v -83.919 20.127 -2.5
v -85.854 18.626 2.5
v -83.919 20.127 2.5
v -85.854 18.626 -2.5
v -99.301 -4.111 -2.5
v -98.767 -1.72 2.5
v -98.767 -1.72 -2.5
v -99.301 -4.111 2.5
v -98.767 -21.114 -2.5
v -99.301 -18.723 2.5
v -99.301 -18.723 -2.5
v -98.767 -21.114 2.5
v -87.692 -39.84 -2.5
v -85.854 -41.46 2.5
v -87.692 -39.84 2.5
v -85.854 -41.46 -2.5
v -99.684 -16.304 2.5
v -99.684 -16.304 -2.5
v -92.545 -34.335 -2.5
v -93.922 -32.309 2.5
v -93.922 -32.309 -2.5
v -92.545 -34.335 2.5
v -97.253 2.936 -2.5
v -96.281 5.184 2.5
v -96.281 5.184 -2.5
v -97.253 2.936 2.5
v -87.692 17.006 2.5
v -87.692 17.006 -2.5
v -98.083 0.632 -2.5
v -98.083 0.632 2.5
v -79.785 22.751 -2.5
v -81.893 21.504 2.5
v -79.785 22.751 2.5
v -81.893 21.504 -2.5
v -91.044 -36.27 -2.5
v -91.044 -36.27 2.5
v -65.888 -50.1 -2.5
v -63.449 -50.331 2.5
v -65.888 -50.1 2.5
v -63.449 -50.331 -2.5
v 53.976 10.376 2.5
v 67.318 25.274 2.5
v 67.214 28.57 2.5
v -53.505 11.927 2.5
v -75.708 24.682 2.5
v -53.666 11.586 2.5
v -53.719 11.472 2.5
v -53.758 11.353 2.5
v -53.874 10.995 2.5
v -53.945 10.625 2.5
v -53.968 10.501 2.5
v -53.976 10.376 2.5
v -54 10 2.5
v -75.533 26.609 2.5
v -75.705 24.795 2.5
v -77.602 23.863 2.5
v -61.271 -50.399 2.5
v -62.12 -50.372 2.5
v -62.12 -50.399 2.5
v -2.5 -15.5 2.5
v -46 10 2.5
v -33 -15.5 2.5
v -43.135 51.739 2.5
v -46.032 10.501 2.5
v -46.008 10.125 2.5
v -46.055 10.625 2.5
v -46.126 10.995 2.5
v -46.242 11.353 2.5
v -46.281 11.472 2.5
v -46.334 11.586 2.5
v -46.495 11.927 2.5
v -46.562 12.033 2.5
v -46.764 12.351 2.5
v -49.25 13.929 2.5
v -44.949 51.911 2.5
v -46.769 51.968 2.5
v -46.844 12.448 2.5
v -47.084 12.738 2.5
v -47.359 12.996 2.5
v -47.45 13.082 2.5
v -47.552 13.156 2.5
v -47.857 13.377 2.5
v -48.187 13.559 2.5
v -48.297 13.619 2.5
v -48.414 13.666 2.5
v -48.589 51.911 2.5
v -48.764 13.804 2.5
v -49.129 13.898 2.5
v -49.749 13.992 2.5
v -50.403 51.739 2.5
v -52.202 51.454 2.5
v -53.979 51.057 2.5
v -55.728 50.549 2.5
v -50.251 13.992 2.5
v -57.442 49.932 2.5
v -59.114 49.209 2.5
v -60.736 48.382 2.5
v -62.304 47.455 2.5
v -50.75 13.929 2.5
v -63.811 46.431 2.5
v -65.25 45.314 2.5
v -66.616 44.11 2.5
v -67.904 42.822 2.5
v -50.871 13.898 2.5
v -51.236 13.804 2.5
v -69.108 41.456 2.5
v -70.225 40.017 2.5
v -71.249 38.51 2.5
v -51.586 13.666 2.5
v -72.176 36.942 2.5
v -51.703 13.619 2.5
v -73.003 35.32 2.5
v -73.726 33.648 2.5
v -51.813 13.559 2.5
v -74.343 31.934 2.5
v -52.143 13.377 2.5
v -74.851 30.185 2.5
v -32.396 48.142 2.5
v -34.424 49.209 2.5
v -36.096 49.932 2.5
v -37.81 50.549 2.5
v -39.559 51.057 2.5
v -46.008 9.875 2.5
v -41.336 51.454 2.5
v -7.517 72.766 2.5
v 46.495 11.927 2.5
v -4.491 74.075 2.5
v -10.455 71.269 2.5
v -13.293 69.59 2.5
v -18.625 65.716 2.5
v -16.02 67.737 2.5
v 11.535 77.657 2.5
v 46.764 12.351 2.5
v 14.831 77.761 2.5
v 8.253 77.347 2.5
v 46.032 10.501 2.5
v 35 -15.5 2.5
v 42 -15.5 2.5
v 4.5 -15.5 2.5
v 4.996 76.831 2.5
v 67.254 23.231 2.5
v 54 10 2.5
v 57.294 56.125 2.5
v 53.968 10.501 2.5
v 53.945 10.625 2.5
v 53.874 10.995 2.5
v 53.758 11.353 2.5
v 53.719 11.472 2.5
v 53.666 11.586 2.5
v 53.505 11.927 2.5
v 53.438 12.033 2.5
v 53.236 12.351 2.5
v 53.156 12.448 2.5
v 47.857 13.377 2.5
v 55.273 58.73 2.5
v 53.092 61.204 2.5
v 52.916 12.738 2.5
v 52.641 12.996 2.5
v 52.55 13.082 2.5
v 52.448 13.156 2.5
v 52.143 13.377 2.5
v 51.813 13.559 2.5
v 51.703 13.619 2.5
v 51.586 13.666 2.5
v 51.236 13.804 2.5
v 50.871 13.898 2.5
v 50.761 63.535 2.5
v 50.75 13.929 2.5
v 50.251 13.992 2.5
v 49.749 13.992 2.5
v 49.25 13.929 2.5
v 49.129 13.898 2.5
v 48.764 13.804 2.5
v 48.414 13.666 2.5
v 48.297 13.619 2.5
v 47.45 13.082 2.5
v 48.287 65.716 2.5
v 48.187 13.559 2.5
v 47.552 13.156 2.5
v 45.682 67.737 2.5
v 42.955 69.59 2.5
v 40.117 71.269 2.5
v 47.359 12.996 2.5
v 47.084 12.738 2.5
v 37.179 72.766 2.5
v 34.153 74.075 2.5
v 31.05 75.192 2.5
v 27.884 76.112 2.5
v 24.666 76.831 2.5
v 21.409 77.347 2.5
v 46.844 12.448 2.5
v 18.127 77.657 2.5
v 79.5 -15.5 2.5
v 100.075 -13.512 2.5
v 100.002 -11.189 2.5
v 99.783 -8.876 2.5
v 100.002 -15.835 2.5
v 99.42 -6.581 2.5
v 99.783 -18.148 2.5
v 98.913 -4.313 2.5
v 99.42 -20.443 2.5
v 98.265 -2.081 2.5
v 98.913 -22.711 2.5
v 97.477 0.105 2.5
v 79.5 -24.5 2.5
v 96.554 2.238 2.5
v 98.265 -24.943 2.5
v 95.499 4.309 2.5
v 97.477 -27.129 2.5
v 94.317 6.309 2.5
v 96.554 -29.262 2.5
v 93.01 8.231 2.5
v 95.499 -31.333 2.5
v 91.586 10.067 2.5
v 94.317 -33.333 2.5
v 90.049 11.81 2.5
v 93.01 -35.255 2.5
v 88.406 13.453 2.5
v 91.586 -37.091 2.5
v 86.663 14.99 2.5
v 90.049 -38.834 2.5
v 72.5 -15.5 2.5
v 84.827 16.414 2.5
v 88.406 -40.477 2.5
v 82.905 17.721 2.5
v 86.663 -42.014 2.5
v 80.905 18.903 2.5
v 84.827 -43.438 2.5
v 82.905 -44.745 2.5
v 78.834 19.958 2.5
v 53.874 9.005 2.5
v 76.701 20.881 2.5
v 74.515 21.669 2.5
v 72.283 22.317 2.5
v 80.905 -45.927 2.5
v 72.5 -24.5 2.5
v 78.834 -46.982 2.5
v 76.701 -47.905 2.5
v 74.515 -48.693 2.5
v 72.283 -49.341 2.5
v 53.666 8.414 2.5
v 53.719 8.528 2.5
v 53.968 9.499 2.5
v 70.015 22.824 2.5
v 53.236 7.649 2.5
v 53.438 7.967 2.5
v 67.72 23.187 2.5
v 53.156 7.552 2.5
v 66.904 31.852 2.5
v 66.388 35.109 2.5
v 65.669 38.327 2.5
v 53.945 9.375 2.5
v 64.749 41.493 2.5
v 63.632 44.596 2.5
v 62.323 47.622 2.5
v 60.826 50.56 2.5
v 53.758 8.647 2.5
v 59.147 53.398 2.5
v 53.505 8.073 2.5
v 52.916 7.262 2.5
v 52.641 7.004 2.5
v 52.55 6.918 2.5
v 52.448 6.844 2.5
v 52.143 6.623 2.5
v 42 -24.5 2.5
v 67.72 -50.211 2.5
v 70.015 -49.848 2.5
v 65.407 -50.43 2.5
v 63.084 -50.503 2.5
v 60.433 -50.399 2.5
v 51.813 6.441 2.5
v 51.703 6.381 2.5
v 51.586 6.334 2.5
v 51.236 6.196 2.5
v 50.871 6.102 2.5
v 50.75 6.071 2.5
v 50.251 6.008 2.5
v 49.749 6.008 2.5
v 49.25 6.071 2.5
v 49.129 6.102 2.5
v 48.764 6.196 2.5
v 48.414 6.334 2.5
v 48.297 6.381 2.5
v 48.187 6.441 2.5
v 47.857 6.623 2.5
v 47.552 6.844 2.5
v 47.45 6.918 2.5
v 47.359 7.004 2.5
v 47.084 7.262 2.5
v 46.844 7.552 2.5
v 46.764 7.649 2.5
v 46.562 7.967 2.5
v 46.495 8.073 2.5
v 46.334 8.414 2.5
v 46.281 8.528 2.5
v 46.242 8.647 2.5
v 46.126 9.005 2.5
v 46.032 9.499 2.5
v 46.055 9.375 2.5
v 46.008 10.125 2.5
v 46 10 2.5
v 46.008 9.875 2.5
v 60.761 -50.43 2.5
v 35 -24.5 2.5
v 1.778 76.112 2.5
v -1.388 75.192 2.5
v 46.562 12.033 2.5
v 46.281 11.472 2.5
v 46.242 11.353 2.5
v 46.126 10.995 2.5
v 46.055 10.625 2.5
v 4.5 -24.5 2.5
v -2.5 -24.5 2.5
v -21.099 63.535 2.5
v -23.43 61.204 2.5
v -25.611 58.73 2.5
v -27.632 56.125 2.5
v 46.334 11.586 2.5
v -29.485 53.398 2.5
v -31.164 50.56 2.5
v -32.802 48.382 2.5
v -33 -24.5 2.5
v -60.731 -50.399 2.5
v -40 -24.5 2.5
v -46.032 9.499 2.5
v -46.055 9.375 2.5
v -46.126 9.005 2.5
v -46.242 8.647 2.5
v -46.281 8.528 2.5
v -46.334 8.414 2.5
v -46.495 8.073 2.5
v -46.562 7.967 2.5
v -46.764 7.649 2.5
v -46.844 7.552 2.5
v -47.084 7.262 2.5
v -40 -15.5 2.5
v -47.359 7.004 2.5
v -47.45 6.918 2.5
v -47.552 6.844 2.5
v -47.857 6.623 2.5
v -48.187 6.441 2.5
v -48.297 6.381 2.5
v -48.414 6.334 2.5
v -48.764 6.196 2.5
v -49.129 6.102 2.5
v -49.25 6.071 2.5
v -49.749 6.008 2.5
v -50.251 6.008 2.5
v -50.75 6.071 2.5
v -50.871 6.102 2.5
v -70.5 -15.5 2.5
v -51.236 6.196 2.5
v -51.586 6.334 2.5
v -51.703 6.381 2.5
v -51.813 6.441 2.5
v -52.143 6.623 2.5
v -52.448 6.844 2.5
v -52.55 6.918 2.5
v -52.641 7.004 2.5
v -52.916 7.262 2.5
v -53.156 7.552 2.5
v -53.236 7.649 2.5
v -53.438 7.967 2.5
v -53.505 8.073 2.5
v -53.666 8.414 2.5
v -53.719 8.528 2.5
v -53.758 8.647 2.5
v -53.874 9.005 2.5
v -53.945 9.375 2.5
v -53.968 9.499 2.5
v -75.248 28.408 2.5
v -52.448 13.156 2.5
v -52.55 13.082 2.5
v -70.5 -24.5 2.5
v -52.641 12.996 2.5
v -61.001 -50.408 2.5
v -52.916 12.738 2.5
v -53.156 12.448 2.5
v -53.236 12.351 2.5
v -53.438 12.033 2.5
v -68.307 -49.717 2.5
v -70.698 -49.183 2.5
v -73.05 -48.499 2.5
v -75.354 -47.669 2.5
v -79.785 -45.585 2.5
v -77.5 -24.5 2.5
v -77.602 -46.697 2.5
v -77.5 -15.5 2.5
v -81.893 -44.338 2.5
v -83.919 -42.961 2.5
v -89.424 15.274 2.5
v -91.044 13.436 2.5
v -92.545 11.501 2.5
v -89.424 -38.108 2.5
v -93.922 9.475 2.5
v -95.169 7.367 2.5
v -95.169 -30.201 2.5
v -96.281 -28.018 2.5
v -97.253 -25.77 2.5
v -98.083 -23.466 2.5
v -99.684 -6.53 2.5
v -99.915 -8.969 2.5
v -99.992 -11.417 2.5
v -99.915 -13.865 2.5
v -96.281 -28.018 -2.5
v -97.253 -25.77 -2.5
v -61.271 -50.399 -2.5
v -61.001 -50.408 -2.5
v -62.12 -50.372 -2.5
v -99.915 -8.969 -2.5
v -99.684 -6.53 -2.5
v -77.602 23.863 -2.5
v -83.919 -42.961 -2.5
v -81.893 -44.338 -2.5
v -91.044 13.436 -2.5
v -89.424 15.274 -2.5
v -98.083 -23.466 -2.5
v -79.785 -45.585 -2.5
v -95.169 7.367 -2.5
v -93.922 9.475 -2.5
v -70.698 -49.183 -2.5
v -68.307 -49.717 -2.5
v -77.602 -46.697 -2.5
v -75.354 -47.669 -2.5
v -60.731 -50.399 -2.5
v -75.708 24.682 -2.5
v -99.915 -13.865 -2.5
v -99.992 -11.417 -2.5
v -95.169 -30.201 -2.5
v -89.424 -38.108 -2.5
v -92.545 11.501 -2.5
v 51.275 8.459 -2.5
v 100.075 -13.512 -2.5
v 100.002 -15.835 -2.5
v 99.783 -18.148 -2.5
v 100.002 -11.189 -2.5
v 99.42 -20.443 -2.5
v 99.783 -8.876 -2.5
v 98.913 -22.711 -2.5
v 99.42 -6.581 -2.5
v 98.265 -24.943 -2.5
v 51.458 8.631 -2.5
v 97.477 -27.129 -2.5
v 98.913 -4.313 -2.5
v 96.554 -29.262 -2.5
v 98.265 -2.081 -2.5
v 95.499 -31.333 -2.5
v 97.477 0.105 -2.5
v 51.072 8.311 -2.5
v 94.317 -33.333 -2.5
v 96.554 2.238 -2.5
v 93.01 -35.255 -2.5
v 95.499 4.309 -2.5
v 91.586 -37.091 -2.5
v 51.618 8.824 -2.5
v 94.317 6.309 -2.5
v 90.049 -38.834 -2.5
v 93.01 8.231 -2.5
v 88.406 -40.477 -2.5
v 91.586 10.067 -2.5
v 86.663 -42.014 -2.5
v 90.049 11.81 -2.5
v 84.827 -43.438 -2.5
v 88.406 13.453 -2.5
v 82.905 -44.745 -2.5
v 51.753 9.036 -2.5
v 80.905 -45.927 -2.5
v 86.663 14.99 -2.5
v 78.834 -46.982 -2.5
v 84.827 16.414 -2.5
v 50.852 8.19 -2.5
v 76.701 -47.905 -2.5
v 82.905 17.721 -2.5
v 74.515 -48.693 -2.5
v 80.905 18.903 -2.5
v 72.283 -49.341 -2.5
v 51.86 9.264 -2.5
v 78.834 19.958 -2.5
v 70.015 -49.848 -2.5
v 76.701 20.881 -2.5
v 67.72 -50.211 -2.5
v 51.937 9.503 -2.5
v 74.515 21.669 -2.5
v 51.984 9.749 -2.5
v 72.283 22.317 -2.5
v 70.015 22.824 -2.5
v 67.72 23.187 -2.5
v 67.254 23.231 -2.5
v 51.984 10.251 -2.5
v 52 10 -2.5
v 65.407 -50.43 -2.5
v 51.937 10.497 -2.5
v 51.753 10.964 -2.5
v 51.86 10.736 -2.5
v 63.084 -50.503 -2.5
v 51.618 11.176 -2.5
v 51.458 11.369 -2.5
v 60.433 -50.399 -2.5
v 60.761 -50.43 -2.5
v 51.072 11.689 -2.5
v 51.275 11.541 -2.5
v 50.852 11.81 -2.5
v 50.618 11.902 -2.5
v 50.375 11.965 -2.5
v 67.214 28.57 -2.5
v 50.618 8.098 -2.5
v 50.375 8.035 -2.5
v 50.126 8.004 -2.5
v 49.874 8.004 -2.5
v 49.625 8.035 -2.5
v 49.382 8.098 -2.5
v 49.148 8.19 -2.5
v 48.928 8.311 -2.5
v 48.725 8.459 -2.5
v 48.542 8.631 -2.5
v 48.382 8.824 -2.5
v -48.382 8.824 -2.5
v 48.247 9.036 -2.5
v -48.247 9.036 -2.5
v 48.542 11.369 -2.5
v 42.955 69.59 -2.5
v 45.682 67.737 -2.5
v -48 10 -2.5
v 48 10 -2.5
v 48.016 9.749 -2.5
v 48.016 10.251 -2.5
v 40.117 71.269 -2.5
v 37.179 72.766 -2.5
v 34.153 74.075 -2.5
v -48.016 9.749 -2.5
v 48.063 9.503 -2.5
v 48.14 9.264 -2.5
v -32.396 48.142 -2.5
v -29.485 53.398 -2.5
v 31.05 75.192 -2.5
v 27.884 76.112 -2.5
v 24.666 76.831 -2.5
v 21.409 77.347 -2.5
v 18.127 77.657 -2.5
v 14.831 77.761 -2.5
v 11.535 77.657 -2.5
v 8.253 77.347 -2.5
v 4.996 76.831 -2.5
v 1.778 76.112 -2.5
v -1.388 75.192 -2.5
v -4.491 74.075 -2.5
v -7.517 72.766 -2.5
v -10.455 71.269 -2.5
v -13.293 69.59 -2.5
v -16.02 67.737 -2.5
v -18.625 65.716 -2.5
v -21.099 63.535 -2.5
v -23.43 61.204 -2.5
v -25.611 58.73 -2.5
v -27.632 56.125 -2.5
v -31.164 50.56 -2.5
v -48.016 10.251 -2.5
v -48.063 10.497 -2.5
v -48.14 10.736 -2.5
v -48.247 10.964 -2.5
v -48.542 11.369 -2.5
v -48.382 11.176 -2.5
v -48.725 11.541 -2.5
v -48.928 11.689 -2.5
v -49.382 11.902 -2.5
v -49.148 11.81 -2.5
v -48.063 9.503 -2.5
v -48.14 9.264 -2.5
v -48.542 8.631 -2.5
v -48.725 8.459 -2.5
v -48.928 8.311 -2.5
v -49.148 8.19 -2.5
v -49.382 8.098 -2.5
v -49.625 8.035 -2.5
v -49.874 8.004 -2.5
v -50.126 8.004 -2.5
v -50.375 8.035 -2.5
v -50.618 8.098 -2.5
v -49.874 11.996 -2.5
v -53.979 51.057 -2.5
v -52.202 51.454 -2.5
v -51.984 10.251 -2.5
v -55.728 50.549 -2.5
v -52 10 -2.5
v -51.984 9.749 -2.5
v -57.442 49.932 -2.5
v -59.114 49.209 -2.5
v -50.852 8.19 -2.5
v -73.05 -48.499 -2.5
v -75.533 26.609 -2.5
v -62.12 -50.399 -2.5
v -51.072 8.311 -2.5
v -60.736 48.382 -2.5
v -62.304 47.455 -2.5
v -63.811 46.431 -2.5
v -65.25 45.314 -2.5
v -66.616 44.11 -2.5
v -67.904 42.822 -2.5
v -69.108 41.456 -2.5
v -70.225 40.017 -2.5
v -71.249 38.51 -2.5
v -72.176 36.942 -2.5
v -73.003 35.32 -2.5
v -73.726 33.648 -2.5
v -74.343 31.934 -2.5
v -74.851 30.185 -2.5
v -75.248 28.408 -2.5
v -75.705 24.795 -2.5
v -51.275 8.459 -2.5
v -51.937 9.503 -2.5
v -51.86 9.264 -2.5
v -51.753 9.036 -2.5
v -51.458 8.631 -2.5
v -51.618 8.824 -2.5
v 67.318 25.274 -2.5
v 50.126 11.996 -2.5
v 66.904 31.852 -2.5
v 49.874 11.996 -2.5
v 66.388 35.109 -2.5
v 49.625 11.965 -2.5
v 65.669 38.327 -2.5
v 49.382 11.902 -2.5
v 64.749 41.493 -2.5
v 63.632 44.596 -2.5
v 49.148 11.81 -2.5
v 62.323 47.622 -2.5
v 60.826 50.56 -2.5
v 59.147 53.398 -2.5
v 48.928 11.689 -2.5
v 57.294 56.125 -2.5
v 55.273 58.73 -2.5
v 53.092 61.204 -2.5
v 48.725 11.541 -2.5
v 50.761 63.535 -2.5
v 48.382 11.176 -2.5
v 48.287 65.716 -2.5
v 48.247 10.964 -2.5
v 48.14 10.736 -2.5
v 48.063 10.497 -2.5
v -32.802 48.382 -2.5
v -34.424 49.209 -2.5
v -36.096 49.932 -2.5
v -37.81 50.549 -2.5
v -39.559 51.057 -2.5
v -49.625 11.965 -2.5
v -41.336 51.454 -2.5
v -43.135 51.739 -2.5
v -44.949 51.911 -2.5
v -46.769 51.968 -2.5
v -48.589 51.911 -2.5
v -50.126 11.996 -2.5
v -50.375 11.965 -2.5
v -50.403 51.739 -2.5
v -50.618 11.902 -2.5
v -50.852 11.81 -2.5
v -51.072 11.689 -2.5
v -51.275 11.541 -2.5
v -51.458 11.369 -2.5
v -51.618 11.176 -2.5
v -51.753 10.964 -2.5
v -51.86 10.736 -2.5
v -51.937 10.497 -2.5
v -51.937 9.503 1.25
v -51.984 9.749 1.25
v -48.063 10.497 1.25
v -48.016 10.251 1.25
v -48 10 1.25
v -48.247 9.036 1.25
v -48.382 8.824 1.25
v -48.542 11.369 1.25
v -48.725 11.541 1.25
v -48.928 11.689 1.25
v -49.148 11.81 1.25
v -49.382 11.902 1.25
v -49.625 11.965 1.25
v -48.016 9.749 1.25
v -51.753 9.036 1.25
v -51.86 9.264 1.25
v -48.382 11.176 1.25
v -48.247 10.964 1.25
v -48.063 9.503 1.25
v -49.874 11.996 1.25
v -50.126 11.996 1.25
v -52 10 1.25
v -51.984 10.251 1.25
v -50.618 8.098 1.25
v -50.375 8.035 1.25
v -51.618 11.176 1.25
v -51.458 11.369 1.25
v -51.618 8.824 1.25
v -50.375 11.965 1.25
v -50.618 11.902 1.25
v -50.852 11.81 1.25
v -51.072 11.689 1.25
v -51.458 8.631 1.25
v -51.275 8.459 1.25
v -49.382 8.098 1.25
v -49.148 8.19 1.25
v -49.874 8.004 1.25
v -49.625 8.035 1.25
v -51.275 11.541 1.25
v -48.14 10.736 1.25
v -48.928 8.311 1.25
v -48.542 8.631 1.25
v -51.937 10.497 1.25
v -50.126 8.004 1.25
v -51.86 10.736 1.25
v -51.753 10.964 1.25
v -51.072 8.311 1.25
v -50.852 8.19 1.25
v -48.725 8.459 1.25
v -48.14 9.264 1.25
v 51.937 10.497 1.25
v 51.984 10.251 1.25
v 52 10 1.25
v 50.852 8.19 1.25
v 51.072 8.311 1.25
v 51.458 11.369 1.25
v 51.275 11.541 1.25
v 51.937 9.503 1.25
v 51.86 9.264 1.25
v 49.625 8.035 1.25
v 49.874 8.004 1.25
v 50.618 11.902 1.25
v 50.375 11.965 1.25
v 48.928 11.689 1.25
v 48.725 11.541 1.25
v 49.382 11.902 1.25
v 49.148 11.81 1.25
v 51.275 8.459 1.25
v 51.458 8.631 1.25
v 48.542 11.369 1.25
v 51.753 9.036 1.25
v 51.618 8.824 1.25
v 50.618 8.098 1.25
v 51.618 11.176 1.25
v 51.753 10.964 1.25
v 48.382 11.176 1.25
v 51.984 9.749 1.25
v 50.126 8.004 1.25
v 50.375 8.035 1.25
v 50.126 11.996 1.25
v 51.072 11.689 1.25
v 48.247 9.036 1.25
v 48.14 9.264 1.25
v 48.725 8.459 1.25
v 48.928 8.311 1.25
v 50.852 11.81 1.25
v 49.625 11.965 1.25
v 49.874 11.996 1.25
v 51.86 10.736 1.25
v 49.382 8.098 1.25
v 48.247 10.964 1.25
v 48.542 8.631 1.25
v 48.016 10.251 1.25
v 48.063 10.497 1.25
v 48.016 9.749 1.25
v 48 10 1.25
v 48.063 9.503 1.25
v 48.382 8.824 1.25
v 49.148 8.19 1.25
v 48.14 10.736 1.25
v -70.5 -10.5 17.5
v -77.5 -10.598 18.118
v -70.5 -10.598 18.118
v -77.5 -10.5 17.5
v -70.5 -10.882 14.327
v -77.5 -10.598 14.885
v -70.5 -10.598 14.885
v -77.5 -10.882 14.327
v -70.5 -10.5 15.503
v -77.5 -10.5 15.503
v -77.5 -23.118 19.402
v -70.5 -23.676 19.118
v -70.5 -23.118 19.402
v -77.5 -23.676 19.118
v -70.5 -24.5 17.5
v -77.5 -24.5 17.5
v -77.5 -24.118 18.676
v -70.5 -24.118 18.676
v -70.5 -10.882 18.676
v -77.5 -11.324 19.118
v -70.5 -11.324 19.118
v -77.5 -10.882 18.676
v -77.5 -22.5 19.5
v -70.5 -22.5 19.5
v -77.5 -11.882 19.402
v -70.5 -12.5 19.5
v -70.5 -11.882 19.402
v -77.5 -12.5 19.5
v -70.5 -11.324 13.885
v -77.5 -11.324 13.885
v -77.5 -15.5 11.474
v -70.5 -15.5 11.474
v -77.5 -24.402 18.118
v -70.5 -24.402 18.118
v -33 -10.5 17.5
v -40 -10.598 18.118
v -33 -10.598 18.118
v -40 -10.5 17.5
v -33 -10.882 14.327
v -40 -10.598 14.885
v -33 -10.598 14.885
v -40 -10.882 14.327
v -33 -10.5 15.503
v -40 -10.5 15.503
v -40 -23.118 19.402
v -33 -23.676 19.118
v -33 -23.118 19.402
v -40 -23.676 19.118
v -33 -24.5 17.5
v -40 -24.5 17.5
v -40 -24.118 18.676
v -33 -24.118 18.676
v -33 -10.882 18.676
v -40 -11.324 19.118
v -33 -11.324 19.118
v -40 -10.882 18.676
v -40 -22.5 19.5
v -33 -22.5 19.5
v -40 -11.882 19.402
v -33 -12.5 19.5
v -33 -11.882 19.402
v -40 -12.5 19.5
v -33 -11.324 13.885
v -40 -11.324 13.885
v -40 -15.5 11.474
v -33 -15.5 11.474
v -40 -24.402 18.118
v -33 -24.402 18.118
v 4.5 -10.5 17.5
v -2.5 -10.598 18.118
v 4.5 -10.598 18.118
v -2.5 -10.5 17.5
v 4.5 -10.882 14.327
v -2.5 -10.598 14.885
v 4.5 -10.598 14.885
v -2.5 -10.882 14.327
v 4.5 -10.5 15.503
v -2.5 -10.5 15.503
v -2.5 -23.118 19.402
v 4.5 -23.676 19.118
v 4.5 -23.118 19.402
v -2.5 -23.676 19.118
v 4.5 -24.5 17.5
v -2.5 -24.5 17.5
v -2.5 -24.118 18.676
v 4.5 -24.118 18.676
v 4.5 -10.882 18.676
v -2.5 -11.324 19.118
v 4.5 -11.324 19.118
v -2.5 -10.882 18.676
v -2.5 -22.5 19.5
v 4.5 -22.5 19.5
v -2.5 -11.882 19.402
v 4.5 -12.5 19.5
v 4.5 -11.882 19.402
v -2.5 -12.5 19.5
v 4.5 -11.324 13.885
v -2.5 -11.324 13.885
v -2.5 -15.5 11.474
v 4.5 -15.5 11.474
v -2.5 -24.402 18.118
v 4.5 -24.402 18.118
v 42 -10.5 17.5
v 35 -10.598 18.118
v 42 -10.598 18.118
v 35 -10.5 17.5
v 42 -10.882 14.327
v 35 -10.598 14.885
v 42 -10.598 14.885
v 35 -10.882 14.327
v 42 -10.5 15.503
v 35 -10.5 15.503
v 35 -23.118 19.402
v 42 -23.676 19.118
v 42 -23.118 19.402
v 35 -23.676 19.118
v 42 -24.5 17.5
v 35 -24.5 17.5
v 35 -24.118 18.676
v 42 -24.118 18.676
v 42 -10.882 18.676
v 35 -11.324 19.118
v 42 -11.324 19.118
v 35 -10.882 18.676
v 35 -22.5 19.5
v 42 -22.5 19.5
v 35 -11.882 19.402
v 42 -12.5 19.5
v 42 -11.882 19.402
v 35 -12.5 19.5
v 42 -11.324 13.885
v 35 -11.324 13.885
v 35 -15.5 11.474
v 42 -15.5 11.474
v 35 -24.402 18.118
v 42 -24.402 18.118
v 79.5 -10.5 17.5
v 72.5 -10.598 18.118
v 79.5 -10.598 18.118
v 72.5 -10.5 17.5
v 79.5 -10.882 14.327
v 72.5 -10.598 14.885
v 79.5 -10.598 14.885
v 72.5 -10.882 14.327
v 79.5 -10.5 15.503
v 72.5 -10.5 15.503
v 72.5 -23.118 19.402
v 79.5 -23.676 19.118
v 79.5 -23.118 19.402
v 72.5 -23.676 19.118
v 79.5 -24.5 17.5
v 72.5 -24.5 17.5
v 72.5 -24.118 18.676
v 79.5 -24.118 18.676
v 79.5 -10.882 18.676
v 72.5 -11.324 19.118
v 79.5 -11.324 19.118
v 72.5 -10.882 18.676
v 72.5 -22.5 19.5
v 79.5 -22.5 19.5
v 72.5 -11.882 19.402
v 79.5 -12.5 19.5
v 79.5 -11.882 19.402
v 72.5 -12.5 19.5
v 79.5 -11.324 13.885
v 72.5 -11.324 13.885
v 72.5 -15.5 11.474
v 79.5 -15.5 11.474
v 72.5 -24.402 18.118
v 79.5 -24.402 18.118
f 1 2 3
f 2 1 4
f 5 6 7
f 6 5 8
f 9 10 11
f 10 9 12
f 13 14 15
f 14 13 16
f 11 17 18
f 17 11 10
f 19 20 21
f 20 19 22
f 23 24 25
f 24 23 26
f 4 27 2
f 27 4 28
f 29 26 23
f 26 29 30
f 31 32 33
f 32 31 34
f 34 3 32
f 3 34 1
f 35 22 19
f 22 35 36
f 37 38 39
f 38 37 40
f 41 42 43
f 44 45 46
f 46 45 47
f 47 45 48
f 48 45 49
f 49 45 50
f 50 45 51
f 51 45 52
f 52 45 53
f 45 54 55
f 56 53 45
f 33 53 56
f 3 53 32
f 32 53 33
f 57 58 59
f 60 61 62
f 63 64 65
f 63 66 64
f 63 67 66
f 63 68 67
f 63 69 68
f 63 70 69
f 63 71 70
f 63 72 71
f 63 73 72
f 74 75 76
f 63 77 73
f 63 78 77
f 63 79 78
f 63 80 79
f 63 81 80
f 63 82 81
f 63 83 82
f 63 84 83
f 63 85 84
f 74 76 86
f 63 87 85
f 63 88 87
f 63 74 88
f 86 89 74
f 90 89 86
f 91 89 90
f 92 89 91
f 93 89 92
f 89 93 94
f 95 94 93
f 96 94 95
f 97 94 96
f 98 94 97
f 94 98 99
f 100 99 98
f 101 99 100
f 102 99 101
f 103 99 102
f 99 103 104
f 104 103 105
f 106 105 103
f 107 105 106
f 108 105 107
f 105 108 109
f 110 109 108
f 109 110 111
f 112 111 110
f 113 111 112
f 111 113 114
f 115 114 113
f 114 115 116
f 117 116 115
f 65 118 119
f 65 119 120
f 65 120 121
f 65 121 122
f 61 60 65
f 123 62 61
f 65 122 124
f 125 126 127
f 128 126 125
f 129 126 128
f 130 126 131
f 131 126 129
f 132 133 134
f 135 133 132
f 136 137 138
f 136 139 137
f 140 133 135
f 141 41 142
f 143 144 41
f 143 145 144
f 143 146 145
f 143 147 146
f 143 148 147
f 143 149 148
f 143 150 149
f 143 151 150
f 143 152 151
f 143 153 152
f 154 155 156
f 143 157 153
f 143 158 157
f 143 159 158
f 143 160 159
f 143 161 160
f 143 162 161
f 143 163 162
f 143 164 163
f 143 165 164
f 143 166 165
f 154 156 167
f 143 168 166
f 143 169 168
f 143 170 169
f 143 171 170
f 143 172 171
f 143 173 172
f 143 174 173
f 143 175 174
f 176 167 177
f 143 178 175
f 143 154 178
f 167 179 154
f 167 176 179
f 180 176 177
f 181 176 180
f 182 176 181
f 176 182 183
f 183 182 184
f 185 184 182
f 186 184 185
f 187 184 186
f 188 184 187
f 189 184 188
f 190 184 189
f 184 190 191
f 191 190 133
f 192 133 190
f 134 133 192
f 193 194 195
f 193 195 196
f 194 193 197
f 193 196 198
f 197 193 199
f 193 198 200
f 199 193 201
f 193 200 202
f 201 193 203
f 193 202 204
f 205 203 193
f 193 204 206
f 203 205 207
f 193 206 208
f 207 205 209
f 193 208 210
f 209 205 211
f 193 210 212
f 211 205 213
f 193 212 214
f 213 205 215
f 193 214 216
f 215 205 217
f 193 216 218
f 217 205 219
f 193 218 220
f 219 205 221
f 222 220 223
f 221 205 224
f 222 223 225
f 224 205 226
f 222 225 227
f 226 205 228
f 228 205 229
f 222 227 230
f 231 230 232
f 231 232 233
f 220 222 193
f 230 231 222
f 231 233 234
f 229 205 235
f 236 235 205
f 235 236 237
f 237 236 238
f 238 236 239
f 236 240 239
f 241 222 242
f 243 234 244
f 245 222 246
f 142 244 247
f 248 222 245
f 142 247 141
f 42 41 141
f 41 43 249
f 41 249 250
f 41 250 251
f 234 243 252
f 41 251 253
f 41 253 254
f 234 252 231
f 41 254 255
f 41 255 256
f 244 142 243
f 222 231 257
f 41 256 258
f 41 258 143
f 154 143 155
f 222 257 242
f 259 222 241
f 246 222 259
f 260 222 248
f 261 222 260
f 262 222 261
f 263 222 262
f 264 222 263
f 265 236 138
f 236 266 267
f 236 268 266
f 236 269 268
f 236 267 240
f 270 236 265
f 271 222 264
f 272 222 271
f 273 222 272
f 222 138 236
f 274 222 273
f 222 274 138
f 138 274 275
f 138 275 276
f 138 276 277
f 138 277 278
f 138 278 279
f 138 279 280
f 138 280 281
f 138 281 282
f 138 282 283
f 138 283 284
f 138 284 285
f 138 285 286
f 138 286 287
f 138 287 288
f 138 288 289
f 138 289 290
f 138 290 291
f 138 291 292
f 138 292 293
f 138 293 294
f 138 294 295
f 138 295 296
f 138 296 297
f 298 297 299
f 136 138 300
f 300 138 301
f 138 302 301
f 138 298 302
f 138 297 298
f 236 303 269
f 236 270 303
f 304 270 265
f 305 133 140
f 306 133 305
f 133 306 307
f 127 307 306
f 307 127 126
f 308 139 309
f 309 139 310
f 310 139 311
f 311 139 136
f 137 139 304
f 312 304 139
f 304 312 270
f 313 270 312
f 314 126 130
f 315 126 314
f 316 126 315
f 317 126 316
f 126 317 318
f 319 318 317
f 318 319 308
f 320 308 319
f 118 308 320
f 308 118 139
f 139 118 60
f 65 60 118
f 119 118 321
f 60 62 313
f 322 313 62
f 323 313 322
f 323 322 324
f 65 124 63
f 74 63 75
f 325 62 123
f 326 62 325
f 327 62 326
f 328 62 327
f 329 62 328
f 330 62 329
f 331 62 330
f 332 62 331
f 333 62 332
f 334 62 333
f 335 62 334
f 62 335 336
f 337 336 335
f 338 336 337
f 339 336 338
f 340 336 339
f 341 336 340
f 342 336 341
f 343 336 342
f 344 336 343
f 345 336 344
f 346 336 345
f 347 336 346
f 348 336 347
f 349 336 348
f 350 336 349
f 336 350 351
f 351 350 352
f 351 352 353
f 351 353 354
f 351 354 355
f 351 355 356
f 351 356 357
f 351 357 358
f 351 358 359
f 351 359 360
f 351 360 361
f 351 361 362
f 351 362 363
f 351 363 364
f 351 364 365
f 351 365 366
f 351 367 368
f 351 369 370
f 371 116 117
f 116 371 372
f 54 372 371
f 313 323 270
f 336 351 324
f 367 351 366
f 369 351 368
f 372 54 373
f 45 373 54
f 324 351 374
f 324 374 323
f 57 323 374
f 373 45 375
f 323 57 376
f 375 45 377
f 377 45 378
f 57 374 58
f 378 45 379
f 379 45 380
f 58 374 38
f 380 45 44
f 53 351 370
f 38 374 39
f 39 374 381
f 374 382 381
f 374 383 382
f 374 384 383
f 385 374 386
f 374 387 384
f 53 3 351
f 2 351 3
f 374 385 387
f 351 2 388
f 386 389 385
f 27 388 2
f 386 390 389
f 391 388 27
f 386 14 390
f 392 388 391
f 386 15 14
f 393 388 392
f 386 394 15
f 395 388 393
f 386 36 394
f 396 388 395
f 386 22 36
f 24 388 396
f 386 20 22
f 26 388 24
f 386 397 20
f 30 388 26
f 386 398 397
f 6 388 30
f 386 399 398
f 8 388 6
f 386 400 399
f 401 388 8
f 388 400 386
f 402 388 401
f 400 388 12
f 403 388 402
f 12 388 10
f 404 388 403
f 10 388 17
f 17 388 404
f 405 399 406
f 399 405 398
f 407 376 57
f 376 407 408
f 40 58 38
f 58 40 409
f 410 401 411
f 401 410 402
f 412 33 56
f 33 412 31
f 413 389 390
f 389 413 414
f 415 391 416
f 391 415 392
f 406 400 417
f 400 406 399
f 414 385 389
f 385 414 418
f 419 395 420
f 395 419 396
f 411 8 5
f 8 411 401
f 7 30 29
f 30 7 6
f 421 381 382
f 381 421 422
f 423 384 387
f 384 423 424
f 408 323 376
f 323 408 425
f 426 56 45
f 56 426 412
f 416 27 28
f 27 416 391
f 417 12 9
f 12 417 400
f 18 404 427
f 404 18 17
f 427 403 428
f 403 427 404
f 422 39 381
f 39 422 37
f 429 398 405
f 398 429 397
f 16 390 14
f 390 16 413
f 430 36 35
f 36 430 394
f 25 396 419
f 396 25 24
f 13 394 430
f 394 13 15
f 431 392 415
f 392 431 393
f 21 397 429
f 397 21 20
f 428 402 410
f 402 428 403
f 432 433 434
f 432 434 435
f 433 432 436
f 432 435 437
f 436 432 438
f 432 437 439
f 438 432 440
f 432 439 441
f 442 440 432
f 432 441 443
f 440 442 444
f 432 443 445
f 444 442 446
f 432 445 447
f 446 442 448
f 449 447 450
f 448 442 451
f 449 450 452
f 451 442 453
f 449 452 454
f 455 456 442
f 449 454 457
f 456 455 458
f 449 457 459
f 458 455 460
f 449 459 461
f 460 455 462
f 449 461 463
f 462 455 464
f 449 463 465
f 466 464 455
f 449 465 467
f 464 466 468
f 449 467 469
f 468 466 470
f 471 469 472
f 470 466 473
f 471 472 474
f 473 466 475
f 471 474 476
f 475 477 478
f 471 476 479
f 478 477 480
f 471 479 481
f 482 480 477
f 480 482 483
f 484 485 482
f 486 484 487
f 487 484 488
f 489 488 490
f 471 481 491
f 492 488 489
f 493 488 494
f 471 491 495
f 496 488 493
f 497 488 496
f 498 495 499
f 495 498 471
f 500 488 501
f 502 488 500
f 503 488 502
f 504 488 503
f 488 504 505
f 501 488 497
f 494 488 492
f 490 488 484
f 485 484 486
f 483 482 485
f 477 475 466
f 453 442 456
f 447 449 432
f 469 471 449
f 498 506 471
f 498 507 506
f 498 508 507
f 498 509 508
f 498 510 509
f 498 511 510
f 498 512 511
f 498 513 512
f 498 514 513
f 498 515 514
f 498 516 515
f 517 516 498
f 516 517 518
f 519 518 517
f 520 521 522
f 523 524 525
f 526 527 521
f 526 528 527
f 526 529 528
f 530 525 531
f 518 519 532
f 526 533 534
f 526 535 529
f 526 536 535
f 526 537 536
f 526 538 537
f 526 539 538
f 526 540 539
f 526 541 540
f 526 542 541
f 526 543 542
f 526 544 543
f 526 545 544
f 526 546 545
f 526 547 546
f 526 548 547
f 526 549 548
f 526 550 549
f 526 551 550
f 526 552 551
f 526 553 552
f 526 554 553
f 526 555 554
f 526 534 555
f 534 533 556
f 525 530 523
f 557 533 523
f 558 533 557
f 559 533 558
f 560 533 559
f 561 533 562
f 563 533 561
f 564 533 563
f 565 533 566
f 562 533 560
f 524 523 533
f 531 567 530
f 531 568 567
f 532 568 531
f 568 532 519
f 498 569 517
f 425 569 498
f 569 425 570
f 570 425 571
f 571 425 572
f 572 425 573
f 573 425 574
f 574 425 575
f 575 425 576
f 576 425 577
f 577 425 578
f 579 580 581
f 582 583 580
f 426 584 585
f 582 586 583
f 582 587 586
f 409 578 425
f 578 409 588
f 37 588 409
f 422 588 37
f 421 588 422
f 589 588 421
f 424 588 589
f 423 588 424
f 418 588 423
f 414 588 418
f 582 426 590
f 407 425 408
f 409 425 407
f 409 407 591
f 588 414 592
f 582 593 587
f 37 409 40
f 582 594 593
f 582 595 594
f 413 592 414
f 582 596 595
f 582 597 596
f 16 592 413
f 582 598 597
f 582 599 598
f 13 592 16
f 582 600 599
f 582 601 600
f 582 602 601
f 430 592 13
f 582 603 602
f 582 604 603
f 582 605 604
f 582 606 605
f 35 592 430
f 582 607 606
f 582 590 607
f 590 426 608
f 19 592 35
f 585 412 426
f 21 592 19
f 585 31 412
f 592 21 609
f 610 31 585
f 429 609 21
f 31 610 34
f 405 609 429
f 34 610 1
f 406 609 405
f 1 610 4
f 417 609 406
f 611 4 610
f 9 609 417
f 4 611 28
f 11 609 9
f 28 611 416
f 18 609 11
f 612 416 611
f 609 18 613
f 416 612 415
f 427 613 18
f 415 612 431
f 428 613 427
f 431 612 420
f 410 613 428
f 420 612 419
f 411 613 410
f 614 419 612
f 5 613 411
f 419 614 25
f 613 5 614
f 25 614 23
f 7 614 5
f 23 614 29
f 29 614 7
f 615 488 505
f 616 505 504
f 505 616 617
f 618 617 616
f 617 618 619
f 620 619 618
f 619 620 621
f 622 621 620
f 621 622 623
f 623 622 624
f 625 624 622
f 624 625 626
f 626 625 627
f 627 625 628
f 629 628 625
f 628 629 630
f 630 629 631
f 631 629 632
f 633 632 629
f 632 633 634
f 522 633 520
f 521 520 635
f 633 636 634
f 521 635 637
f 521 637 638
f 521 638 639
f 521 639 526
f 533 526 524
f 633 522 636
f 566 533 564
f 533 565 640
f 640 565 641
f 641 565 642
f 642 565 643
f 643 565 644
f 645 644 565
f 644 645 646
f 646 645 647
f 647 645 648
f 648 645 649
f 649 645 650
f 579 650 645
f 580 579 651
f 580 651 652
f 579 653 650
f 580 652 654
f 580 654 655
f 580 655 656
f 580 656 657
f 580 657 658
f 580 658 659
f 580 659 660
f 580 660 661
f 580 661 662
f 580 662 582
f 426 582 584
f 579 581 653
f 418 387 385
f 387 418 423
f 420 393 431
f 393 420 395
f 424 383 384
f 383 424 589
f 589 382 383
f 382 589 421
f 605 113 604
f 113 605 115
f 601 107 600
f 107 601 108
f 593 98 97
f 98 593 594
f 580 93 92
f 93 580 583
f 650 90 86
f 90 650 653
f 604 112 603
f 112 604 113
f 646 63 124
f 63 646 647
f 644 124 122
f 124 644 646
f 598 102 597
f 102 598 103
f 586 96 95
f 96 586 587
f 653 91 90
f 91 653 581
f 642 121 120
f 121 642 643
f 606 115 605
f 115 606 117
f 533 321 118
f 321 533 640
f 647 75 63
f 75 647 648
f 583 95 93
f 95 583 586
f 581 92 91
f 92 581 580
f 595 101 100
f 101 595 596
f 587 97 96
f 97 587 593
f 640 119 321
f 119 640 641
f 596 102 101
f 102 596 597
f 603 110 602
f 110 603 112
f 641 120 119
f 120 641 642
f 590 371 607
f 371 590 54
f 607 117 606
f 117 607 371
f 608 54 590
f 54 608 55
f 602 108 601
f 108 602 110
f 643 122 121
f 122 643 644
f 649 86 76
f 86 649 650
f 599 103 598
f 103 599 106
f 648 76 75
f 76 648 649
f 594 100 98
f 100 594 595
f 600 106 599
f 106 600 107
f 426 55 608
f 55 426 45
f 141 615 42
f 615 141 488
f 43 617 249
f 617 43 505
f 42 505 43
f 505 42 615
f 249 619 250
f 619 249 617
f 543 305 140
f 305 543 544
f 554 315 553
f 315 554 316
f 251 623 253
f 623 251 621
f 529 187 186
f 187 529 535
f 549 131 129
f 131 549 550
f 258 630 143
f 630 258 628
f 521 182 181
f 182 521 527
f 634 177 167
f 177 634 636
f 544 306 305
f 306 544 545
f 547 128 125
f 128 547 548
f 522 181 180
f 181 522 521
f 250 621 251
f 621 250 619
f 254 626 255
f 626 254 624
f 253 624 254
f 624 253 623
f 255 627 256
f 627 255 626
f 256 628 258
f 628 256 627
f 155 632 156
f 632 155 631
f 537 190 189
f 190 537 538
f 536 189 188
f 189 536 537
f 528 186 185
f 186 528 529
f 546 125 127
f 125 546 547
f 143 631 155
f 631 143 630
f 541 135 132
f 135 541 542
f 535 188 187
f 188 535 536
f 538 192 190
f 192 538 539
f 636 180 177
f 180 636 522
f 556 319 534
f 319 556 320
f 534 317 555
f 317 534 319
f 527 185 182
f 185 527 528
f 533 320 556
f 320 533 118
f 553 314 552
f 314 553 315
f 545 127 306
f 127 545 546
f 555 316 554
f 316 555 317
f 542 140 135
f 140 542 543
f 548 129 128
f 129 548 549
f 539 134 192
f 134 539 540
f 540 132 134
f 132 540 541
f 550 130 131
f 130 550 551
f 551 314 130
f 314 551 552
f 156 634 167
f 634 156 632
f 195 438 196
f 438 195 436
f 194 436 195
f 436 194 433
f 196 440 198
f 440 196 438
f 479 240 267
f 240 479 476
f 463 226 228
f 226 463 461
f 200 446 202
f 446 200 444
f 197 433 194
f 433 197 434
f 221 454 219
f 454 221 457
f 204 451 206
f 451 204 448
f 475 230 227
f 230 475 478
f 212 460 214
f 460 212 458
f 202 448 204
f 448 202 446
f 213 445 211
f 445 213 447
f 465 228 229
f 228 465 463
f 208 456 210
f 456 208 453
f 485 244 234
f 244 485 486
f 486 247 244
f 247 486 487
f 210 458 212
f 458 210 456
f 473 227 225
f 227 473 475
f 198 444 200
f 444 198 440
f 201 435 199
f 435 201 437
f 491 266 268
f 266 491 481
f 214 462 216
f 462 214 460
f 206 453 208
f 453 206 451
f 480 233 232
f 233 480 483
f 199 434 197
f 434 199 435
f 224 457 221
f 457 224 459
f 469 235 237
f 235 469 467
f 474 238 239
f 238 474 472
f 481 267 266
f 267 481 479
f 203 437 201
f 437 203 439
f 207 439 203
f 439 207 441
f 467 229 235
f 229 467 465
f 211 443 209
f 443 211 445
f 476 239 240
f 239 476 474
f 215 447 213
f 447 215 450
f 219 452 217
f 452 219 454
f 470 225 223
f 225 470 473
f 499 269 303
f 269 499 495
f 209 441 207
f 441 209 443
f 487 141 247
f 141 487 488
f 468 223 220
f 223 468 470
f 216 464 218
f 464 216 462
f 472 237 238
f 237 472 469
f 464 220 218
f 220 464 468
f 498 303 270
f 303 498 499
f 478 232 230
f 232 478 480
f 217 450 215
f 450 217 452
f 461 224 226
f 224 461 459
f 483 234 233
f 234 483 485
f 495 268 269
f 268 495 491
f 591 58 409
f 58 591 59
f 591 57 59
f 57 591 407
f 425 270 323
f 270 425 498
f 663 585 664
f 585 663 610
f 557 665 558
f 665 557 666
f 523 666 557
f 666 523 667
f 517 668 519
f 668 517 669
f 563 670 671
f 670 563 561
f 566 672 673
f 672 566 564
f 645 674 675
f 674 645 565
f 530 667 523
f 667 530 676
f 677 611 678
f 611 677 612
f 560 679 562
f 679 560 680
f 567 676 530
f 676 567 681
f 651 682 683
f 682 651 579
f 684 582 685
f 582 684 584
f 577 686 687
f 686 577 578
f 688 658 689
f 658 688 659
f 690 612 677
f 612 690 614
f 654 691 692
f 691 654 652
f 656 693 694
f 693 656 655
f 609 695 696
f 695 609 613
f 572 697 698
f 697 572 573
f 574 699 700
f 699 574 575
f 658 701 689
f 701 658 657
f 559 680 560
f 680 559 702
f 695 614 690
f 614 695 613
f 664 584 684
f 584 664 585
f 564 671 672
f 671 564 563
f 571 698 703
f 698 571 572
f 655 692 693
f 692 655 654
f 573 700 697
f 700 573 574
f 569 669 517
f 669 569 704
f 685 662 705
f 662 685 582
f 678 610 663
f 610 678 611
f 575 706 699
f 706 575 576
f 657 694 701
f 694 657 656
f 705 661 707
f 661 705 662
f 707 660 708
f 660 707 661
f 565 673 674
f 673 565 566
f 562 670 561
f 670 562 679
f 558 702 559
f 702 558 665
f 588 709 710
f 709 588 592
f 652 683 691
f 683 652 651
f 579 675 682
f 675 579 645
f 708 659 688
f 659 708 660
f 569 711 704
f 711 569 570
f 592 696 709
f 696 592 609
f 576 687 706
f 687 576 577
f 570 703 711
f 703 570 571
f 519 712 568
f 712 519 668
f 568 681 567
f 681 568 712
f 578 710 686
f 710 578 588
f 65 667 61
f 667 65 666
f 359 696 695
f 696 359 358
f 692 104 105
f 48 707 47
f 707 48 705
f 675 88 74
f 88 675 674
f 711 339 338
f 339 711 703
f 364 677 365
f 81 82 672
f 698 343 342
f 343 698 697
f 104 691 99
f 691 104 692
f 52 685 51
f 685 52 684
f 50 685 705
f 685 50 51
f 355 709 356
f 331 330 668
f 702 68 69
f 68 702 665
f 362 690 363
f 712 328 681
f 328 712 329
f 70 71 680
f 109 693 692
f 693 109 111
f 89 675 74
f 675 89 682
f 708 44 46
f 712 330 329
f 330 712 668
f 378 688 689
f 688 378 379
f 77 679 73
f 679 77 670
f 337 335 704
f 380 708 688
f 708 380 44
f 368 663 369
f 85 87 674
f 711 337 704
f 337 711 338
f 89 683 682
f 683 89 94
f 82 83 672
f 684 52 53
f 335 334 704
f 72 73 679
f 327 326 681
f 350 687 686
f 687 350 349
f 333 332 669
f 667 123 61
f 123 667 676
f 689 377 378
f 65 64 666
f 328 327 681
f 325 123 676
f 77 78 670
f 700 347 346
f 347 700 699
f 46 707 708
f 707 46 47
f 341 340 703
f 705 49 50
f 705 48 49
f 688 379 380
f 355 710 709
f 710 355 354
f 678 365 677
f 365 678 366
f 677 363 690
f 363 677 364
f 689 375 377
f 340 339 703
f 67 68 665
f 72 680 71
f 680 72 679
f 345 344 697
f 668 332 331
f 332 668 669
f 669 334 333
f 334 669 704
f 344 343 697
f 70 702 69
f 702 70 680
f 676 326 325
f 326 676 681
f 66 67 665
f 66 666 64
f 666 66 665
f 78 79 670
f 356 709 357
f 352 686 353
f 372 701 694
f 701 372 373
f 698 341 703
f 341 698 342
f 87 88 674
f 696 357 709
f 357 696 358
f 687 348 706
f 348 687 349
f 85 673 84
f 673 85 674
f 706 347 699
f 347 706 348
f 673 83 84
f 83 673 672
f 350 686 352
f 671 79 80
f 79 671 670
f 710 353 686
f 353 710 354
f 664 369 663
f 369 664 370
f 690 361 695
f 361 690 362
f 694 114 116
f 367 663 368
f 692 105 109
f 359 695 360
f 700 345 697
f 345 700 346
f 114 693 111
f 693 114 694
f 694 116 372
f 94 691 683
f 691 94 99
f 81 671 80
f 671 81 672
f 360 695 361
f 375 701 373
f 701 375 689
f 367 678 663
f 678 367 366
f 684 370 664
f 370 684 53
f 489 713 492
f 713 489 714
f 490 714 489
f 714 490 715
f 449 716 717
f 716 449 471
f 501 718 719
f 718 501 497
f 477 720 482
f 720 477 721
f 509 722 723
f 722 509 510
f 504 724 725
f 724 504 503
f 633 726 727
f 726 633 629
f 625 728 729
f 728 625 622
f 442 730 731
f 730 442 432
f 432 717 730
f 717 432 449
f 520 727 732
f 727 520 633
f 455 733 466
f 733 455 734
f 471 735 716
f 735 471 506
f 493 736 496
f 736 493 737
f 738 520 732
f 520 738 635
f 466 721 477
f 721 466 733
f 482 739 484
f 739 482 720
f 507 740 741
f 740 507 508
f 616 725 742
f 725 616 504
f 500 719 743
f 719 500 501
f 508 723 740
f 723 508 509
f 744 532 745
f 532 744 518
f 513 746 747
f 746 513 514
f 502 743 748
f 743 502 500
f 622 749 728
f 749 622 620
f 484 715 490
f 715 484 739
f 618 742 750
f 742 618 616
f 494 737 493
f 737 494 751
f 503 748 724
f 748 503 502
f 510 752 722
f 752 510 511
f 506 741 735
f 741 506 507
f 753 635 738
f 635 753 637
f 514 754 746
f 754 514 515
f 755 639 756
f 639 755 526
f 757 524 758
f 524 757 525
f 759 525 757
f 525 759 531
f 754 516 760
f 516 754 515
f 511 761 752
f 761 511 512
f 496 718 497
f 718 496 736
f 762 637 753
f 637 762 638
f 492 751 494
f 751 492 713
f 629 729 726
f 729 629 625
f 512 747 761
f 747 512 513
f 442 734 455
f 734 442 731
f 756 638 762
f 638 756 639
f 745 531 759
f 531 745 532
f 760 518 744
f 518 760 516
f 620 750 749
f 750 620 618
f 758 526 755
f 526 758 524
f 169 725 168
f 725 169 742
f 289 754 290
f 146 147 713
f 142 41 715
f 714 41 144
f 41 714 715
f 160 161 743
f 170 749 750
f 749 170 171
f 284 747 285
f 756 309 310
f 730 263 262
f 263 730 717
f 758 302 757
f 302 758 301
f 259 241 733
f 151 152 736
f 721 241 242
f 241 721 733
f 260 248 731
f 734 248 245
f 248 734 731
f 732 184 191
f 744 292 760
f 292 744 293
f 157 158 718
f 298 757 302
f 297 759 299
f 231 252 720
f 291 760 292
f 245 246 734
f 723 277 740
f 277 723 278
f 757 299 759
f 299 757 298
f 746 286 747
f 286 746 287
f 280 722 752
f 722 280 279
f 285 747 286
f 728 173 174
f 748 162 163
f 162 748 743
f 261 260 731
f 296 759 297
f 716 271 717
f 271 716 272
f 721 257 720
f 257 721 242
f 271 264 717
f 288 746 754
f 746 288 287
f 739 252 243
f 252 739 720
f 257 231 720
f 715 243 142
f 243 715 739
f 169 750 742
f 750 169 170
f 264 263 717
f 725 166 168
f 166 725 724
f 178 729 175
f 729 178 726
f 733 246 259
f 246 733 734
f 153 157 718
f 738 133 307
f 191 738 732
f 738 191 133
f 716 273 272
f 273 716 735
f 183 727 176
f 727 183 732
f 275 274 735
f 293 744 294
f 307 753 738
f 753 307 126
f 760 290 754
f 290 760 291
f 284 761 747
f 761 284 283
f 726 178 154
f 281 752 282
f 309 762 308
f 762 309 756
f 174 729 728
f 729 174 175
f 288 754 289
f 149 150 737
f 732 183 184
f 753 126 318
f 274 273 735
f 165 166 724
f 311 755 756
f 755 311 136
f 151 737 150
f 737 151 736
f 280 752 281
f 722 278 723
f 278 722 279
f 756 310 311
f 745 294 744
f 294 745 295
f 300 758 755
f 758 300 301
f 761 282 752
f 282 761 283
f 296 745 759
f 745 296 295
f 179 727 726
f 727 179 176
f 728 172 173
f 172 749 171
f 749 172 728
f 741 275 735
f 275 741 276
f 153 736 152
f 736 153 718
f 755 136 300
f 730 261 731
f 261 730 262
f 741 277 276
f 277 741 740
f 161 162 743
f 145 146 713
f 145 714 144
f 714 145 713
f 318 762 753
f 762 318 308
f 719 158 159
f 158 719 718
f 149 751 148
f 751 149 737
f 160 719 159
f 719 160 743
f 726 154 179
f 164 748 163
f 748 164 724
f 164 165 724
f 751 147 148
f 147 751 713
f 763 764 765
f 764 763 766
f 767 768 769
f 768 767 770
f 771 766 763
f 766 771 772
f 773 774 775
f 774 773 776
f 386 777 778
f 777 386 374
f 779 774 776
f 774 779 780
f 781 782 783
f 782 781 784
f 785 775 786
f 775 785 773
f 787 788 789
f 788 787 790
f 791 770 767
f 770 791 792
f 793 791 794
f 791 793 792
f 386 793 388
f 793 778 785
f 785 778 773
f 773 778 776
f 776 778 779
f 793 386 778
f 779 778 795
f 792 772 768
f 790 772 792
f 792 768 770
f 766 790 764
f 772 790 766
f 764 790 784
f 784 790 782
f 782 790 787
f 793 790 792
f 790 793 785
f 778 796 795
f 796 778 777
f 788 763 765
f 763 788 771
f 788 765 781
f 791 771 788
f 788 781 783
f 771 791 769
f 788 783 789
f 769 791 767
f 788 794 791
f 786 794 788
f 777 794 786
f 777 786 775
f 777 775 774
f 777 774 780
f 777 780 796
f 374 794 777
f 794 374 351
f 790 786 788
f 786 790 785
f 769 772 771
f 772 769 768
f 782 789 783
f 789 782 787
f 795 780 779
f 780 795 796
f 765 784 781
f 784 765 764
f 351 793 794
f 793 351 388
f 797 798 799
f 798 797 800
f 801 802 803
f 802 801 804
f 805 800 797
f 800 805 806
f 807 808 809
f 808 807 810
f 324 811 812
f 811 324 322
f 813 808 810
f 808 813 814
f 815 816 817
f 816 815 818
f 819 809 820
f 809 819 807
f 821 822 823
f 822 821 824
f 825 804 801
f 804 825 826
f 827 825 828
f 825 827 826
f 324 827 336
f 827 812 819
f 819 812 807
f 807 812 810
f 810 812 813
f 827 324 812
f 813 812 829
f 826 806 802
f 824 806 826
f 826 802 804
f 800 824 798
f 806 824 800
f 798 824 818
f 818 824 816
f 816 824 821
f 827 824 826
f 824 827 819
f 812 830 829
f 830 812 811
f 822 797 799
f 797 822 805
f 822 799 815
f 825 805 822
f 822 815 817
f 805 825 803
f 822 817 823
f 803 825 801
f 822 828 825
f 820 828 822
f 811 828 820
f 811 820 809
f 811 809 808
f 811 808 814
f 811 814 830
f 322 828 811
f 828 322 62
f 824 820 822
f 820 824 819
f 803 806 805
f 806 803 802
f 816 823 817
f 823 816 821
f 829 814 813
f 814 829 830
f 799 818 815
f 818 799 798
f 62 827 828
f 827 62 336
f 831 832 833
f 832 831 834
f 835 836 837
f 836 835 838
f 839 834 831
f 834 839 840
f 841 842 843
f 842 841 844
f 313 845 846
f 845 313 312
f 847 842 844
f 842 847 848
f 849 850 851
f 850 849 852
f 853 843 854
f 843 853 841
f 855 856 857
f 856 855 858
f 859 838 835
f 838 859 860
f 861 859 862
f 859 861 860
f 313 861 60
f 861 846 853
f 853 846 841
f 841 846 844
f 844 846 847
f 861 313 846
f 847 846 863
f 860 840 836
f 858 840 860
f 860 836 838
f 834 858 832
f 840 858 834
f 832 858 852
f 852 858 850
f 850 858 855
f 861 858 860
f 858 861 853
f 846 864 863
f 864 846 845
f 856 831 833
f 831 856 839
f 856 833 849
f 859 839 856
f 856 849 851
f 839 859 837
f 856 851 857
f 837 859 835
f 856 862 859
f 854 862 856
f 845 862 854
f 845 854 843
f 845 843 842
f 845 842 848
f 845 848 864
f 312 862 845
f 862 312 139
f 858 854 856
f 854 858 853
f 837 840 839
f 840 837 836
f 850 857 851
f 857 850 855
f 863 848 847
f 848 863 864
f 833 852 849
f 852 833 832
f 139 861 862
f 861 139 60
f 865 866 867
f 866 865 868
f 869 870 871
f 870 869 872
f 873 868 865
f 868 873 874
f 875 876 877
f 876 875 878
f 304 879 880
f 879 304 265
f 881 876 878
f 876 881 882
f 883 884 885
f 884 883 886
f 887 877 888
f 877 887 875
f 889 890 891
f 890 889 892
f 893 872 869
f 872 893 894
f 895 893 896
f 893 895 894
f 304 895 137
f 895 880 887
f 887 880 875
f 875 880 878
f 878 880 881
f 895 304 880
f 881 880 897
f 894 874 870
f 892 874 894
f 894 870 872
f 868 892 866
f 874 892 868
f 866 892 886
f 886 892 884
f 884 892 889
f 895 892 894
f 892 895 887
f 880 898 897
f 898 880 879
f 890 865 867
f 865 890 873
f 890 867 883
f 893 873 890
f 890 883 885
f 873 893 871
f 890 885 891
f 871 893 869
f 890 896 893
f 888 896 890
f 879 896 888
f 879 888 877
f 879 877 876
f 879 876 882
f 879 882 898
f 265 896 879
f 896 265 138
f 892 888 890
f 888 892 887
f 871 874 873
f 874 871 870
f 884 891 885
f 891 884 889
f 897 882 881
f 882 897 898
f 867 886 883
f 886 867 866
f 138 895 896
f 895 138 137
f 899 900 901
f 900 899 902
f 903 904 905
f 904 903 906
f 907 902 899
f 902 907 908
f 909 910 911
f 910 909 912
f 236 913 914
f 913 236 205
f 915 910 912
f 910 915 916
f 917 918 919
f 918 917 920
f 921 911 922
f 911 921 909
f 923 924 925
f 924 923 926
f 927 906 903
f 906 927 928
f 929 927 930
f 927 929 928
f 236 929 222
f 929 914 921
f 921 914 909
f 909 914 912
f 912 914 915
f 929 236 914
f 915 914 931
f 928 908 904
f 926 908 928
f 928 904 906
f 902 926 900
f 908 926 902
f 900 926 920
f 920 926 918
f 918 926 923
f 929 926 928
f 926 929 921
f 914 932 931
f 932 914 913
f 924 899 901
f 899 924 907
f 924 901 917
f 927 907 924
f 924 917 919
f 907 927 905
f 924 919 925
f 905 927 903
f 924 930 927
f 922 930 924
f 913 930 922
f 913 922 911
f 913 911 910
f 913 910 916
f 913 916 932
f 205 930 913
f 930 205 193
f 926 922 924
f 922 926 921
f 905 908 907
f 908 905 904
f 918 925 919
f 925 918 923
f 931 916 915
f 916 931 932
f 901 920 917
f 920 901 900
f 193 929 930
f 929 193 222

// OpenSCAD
/*[Variables]*/
height_cloud = 5; // [1:20]

quantity_hook =5; // [1:5]

//offset hook in axis Y
position_hook_offset_y = 4; //

//distance hooks between self
distance_hook = 15; // [5:18]

//length hooks
cube_z = 15; // [9:30]

/*[hidden]*/
size = [0.2 * quantity_hook, 0.2 * quantity_hook, 1];
circle1 = 77.981/2;
circle2 = 57.986/2;
circle3 = 104.974/2;
circle4 = 73.982/2;
cube5_x = 123.917/2;
cube5_y =  42.798/2;
position_hook_y = -position_hook_offset_y * quantity_hook;

cube_xy = 5;

x1 = distance_hook * quantity_hook;

hook1 = [[0,-5,0]];
hook2 = [[-x1,position_hook_y,0], [x1, position_hook_y, 0]];
hook3 = [[-x1,position_hook_y,0], [0, position_hook_y, 0], [x1, position_hook_y, 0]];
hook4 = [[-x1,position_hook_y,0], [-x1/3, position_hook_y, 0], [x1/3, position_hook_y, 0], [x1, position_hook_y, 0]];
hook5 = [[-x1,position_hook_y,0], [-x1/2, position_hook_y, 0], [0, position_hook_y, 0], [x1/2, position_hook_y, 0], [x1, position_hook_y, 0]];

hook = quantity_hook == 1 ? hook1 : quantity_hook == 2 ? hook2 : quantity_hook == 3 ? hook3 : quantity_hook == 4 ? hook4 : quantity_hook == 5 ? hook5 : hook1;
hole1 = [[0, 10, 0]];
hole2 = [[-x1/1.5, 10, height_cloud/2], [x1/1.5, 10, height_cloud/2]];
holes = quantity_hook < 3 ? hole1 : hole2;
difference(){
	scale(v=size){
		union(){
			translate ([-61.001, -11.417, 0]) {
				cylinder(h = height_cloud, r = circle1, center = true, $fn = 100);
			}
			translate ([-46.769, 22.975, 0]) {
				cylinder(h = height_cloud, r = circle2, center = true, $fn = 100);
			}
			translate ([14.831, 25.274, 0]) {
				cylinder(h = height_cloud, r = circle3, center = true, $fn = 100);
			}
			translate ([63.084, -13.512, 0]) {
				cylinder(h = height_cloud, r = circle4, center = true, $fn = 100);
			}
			translate ([-0.162, -29, 0]) {
				cube(size = [123.917, 42.798, height_cloud], center = true);
			}
		}
	}
	for (a = holes){
		union(){
			translate(a){
				 cylinder(h=height_cloud + 20, r=2, $fn=50, center=true);
			}
			translate(a){
				 cylinder(h=height_cloud/2, r1=2, r2 = 6, $fn=50, center=true);
			}
		}
	}
}
$fn = 20;
for(x = hook){
	translate(x){
		minkowski(){
			union(){
				translate ([0,0, (cube_z/2)+(height_cloud/2)]){
					cube(size = [cube_xy, cube_xy, cube_z], center = true);
				}
				difference(){
					translate ([0, 5, (((height_cloud/2)+cube_z)-3.75)]){
						cube(size = [cube_xy, cube_xy, 7.5], center = true);
					}
					translate([0, 6, (((height_cloud/2)+cube_z)-5.75)]){
						rotate([30, 0, 0]){
							#cube(size = [cube_xy+2, 10, 5], center=true);
						}
					}
				}
			}
			rotate([0, 90, 0]){
				cylinder(r = 2, h = 2);
			}
		}
	}
}
